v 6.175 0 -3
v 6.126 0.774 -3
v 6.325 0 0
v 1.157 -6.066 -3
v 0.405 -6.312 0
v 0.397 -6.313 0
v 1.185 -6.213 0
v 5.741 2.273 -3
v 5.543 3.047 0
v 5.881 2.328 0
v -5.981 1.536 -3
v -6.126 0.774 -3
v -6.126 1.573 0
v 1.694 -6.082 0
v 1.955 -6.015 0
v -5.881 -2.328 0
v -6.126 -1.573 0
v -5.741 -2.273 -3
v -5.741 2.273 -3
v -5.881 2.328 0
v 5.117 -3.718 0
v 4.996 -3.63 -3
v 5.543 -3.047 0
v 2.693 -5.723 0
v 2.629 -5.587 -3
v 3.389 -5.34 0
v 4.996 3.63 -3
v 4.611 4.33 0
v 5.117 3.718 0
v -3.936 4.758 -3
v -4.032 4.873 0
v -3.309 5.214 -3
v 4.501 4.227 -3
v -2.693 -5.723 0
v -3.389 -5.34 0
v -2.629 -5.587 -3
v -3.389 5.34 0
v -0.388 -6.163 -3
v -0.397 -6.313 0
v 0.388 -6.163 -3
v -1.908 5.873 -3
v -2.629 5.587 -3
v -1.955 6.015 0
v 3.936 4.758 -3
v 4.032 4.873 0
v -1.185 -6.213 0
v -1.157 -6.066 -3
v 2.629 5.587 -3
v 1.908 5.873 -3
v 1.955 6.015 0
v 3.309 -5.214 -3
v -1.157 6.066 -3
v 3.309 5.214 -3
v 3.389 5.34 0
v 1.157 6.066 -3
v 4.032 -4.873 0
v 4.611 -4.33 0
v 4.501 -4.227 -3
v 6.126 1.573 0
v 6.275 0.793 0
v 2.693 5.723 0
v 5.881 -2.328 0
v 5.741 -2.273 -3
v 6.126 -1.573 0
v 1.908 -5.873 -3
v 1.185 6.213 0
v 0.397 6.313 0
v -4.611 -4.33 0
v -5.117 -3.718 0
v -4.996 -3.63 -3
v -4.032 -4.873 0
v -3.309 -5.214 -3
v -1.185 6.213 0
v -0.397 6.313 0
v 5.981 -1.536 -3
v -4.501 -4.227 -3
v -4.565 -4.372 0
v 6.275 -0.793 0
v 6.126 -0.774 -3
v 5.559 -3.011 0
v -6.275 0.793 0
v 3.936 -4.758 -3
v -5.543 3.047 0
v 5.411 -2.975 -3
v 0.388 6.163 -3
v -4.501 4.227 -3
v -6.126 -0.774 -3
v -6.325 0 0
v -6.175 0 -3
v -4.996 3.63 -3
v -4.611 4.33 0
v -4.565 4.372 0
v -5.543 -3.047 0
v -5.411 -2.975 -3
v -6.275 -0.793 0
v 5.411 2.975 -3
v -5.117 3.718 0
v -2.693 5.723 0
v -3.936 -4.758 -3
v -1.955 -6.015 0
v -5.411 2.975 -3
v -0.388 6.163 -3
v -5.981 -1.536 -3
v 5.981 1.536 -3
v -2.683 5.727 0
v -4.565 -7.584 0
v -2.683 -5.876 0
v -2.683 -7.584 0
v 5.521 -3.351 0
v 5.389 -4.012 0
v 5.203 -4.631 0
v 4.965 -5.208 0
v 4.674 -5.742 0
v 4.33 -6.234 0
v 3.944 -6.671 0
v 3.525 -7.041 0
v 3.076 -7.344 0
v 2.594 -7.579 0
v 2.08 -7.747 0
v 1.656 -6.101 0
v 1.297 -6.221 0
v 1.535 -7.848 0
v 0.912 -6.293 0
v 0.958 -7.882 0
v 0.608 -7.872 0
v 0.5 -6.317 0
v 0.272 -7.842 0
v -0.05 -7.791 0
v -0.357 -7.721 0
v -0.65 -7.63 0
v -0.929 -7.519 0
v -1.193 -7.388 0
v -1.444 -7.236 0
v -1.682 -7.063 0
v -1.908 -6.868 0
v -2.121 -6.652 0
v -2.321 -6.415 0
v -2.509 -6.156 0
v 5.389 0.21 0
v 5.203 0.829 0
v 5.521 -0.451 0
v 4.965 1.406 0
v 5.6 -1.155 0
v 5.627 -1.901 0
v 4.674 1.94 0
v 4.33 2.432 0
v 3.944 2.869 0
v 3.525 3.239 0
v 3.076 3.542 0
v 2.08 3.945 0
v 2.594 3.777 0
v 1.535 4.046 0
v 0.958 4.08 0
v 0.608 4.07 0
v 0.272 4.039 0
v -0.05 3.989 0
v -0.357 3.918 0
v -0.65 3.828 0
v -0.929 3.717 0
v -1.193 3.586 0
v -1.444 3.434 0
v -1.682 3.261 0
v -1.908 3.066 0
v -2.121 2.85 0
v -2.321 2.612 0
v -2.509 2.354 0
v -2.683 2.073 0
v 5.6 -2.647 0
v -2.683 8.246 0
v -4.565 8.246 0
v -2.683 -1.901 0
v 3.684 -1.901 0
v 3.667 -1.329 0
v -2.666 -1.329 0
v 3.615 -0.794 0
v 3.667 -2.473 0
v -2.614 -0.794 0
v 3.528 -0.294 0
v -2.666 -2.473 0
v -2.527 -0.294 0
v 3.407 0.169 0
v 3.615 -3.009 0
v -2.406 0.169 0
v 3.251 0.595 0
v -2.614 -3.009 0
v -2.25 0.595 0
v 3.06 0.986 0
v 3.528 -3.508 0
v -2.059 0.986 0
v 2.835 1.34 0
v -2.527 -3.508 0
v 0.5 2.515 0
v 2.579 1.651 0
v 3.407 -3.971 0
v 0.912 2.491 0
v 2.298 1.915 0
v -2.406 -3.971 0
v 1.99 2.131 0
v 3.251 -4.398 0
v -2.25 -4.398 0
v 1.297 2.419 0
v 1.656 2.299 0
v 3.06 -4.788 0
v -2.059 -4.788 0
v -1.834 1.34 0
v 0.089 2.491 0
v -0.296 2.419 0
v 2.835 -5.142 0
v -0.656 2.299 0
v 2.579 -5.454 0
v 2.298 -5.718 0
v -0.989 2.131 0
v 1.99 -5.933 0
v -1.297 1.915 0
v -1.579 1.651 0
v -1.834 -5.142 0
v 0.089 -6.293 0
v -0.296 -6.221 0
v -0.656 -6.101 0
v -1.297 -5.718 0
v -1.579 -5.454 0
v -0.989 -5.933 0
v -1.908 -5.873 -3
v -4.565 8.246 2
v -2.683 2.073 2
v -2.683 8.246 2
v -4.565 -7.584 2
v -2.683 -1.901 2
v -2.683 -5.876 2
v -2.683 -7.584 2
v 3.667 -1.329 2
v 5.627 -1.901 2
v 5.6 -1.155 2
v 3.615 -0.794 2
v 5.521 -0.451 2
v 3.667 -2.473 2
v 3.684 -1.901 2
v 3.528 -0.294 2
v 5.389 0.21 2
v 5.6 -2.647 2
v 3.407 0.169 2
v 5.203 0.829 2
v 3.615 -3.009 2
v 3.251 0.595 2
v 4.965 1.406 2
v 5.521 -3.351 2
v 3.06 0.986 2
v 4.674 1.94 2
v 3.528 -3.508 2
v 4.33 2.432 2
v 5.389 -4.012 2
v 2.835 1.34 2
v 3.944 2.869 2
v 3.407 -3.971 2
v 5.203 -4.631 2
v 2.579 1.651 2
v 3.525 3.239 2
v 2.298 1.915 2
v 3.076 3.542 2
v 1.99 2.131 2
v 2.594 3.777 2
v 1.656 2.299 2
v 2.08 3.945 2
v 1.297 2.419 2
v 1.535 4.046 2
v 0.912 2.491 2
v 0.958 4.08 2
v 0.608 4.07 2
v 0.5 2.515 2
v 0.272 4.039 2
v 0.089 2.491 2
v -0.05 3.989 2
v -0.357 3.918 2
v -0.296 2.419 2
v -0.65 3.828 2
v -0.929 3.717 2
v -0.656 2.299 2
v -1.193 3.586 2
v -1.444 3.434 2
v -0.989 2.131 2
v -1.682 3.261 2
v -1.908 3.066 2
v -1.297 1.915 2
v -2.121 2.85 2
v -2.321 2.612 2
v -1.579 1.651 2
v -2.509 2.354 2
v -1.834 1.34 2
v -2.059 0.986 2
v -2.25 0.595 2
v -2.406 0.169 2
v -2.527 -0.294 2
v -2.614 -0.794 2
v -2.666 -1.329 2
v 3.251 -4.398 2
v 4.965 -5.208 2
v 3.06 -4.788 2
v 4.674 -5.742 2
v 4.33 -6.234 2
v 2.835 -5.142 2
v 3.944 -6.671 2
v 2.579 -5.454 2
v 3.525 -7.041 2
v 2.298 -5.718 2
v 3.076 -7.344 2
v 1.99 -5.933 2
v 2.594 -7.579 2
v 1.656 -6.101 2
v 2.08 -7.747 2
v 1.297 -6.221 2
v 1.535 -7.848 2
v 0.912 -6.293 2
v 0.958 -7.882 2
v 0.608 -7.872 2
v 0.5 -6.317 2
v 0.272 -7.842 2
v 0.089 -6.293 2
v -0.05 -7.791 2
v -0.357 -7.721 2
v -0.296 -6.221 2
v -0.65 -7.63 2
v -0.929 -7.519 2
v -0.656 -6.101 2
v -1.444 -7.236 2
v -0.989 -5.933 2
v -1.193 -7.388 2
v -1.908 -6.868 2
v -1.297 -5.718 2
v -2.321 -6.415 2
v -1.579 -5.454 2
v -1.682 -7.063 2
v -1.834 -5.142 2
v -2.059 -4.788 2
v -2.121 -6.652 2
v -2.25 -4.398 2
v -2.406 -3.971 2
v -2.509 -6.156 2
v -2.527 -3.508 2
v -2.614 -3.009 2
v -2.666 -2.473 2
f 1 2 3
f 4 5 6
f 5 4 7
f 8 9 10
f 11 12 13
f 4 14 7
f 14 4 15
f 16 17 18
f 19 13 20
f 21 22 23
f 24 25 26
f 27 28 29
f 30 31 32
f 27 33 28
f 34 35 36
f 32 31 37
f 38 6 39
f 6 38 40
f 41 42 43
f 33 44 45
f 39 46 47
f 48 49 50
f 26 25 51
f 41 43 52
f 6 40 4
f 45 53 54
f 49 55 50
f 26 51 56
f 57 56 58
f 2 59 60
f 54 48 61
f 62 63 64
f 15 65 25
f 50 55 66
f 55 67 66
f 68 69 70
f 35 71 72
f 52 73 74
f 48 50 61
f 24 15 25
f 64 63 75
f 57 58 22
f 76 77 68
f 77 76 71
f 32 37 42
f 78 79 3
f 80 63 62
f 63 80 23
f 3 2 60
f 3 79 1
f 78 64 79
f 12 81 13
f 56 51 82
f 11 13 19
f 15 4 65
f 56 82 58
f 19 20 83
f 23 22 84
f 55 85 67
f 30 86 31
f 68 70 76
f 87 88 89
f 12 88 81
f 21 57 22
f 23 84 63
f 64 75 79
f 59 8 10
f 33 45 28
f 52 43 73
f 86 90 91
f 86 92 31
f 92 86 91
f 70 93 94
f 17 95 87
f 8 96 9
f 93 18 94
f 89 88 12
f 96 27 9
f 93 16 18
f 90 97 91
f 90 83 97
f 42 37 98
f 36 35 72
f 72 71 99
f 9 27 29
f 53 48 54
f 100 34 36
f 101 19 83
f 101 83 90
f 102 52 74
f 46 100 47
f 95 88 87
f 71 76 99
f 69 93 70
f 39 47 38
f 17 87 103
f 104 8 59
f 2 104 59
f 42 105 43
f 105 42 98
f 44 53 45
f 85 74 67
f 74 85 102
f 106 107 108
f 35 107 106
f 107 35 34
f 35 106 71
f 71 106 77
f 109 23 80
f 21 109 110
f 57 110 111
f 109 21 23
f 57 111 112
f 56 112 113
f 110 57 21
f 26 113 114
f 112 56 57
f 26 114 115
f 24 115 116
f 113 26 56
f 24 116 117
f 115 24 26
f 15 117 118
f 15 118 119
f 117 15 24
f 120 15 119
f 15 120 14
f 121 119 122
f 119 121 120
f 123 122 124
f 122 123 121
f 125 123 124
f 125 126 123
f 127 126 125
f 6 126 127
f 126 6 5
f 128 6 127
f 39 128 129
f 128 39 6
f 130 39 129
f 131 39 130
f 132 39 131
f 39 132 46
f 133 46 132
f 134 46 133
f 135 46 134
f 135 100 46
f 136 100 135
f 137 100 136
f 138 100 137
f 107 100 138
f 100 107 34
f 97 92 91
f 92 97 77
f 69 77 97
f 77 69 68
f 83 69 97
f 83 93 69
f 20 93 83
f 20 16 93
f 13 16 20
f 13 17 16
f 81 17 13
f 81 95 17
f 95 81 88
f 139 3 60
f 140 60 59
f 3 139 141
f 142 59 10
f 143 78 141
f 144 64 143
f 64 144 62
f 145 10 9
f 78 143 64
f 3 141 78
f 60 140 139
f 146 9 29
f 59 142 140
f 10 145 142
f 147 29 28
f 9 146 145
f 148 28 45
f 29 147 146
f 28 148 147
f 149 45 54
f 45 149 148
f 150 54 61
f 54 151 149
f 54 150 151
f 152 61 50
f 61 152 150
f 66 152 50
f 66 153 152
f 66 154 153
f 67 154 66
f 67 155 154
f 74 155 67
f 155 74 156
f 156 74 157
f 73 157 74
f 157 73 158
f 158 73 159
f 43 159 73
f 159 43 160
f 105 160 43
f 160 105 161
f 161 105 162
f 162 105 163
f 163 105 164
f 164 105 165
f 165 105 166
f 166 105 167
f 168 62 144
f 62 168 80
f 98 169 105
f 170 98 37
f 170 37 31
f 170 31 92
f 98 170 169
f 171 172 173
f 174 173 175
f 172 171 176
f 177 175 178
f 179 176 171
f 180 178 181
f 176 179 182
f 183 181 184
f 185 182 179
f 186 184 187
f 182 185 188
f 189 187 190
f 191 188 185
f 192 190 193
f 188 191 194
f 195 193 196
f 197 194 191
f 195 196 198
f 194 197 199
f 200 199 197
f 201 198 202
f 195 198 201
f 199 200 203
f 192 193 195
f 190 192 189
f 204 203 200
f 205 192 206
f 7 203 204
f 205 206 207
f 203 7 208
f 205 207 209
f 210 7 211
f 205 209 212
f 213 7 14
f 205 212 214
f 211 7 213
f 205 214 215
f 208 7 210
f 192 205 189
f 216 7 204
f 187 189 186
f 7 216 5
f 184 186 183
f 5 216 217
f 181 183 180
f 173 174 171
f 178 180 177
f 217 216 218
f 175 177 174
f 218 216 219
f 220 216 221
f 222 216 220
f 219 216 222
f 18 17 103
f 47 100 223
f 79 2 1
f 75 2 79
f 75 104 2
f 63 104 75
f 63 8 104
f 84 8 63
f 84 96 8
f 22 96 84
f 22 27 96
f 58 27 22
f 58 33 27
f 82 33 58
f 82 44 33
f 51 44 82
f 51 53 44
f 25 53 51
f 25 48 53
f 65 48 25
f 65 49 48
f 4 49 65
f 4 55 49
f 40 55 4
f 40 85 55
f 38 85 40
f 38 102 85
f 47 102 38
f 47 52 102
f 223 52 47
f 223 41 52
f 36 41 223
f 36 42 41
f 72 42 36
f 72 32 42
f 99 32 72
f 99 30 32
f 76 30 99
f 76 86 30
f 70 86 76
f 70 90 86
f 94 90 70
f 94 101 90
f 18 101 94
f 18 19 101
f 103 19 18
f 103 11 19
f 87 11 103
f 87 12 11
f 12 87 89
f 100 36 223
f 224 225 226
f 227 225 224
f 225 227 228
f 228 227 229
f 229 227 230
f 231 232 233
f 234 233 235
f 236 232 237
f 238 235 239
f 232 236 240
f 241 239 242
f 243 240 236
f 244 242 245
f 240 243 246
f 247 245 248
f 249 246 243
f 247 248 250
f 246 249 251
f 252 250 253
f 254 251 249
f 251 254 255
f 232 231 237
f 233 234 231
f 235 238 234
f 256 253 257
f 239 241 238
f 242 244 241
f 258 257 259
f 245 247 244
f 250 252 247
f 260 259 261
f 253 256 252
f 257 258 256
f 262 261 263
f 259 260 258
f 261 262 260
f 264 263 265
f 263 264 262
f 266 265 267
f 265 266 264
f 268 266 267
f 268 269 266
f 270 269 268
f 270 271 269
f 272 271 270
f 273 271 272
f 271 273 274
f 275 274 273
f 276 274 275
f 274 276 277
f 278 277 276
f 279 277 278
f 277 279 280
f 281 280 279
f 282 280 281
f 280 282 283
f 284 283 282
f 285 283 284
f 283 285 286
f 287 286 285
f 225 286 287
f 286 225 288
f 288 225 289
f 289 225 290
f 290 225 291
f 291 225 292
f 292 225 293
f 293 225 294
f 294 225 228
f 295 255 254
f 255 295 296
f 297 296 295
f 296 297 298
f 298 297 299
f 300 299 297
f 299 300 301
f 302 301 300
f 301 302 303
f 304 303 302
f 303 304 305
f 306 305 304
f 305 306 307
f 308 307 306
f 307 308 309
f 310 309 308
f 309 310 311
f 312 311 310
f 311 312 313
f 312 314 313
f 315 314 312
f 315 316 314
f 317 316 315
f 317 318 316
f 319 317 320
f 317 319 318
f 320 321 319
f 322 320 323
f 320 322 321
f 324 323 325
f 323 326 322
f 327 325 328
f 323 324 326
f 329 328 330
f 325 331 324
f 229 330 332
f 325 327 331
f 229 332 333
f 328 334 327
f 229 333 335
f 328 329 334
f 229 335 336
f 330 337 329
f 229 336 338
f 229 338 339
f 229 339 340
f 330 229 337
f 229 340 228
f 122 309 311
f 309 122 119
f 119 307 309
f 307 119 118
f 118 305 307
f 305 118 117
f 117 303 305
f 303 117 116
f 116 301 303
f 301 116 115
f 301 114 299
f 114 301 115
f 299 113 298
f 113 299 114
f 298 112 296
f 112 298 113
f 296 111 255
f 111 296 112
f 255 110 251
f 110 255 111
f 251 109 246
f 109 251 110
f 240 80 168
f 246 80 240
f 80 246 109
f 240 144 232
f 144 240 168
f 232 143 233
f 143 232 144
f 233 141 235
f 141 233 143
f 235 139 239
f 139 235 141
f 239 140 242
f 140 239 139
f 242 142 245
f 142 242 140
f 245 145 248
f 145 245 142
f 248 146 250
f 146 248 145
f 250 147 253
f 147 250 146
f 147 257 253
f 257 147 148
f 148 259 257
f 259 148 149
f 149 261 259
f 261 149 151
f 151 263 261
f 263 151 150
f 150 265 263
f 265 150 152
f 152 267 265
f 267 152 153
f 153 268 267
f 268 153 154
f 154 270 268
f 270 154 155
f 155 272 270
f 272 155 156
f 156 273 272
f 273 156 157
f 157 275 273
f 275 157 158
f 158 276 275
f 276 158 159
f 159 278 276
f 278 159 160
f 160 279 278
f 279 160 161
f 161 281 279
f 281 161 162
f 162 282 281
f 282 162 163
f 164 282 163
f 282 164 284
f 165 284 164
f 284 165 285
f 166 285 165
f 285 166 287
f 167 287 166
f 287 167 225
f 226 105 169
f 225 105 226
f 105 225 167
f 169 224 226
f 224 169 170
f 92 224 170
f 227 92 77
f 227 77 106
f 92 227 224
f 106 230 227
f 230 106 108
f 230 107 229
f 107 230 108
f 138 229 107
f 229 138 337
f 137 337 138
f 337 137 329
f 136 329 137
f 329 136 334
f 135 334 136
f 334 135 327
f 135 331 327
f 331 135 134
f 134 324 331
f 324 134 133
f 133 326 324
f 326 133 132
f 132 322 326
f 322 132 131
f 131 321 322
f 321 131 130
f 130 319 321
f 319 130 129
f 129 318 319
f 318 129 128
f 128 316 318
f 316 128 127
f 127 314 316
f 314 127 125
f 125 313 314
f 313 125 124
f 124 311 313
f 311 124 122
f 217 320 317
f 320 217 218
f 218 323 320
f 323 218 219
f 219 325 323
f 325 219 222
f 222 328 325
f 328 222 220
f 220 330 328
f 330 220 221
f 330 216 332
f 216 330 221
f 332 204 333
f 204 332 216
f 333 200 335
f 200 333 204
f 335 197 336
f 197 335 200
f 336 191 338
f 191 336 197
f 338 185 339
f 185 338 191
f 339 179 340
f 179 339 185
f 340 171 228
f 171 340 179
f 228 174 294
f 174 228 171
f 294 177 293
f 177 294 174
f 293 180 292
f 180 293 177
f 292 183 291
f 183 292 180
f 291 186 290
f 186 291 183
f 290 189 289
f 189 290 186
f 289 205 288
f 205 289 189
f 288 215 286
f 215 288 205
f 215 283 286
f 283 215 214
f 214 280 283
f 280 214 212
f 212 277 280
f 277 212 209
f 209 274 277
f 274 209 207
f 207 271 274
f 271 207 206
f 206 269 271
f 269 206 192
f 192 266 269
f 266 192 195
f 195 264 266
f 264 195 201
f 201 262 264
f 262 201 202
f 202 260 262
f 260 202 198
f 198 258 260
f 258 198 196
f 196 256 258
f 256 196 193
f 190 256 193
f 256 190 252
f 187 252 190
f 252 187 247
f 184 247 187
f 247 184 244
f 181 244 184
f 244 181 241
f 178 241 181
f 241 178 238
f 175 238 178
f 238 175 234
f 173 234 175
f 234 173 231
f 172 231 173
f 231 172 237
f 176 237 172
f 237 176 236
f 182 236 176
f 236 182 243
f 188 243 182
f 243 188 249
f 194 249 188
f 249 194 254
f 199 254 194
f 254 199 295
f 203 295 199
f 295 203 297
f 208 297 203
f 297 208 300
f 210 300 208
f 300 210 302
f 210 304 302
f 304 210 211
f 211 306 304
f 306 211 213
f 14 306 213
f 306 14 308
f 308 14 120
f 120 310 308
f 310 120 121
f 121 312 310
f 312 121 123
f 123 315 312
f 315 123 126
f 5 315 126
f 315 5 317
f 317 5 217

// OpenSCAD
$fn = 50;

difference() {
	union() {
		translate(v = [0, 0, -3.0]) {
			cylinder(h = 3, r1 = 6.175, r2 = 6.325);
		}
		linear_extrude(height = 2) {
			text(font = "Webdings", halign = "center", size = 15, text = "b", valign = "center");
		}
	}
	union();
}
